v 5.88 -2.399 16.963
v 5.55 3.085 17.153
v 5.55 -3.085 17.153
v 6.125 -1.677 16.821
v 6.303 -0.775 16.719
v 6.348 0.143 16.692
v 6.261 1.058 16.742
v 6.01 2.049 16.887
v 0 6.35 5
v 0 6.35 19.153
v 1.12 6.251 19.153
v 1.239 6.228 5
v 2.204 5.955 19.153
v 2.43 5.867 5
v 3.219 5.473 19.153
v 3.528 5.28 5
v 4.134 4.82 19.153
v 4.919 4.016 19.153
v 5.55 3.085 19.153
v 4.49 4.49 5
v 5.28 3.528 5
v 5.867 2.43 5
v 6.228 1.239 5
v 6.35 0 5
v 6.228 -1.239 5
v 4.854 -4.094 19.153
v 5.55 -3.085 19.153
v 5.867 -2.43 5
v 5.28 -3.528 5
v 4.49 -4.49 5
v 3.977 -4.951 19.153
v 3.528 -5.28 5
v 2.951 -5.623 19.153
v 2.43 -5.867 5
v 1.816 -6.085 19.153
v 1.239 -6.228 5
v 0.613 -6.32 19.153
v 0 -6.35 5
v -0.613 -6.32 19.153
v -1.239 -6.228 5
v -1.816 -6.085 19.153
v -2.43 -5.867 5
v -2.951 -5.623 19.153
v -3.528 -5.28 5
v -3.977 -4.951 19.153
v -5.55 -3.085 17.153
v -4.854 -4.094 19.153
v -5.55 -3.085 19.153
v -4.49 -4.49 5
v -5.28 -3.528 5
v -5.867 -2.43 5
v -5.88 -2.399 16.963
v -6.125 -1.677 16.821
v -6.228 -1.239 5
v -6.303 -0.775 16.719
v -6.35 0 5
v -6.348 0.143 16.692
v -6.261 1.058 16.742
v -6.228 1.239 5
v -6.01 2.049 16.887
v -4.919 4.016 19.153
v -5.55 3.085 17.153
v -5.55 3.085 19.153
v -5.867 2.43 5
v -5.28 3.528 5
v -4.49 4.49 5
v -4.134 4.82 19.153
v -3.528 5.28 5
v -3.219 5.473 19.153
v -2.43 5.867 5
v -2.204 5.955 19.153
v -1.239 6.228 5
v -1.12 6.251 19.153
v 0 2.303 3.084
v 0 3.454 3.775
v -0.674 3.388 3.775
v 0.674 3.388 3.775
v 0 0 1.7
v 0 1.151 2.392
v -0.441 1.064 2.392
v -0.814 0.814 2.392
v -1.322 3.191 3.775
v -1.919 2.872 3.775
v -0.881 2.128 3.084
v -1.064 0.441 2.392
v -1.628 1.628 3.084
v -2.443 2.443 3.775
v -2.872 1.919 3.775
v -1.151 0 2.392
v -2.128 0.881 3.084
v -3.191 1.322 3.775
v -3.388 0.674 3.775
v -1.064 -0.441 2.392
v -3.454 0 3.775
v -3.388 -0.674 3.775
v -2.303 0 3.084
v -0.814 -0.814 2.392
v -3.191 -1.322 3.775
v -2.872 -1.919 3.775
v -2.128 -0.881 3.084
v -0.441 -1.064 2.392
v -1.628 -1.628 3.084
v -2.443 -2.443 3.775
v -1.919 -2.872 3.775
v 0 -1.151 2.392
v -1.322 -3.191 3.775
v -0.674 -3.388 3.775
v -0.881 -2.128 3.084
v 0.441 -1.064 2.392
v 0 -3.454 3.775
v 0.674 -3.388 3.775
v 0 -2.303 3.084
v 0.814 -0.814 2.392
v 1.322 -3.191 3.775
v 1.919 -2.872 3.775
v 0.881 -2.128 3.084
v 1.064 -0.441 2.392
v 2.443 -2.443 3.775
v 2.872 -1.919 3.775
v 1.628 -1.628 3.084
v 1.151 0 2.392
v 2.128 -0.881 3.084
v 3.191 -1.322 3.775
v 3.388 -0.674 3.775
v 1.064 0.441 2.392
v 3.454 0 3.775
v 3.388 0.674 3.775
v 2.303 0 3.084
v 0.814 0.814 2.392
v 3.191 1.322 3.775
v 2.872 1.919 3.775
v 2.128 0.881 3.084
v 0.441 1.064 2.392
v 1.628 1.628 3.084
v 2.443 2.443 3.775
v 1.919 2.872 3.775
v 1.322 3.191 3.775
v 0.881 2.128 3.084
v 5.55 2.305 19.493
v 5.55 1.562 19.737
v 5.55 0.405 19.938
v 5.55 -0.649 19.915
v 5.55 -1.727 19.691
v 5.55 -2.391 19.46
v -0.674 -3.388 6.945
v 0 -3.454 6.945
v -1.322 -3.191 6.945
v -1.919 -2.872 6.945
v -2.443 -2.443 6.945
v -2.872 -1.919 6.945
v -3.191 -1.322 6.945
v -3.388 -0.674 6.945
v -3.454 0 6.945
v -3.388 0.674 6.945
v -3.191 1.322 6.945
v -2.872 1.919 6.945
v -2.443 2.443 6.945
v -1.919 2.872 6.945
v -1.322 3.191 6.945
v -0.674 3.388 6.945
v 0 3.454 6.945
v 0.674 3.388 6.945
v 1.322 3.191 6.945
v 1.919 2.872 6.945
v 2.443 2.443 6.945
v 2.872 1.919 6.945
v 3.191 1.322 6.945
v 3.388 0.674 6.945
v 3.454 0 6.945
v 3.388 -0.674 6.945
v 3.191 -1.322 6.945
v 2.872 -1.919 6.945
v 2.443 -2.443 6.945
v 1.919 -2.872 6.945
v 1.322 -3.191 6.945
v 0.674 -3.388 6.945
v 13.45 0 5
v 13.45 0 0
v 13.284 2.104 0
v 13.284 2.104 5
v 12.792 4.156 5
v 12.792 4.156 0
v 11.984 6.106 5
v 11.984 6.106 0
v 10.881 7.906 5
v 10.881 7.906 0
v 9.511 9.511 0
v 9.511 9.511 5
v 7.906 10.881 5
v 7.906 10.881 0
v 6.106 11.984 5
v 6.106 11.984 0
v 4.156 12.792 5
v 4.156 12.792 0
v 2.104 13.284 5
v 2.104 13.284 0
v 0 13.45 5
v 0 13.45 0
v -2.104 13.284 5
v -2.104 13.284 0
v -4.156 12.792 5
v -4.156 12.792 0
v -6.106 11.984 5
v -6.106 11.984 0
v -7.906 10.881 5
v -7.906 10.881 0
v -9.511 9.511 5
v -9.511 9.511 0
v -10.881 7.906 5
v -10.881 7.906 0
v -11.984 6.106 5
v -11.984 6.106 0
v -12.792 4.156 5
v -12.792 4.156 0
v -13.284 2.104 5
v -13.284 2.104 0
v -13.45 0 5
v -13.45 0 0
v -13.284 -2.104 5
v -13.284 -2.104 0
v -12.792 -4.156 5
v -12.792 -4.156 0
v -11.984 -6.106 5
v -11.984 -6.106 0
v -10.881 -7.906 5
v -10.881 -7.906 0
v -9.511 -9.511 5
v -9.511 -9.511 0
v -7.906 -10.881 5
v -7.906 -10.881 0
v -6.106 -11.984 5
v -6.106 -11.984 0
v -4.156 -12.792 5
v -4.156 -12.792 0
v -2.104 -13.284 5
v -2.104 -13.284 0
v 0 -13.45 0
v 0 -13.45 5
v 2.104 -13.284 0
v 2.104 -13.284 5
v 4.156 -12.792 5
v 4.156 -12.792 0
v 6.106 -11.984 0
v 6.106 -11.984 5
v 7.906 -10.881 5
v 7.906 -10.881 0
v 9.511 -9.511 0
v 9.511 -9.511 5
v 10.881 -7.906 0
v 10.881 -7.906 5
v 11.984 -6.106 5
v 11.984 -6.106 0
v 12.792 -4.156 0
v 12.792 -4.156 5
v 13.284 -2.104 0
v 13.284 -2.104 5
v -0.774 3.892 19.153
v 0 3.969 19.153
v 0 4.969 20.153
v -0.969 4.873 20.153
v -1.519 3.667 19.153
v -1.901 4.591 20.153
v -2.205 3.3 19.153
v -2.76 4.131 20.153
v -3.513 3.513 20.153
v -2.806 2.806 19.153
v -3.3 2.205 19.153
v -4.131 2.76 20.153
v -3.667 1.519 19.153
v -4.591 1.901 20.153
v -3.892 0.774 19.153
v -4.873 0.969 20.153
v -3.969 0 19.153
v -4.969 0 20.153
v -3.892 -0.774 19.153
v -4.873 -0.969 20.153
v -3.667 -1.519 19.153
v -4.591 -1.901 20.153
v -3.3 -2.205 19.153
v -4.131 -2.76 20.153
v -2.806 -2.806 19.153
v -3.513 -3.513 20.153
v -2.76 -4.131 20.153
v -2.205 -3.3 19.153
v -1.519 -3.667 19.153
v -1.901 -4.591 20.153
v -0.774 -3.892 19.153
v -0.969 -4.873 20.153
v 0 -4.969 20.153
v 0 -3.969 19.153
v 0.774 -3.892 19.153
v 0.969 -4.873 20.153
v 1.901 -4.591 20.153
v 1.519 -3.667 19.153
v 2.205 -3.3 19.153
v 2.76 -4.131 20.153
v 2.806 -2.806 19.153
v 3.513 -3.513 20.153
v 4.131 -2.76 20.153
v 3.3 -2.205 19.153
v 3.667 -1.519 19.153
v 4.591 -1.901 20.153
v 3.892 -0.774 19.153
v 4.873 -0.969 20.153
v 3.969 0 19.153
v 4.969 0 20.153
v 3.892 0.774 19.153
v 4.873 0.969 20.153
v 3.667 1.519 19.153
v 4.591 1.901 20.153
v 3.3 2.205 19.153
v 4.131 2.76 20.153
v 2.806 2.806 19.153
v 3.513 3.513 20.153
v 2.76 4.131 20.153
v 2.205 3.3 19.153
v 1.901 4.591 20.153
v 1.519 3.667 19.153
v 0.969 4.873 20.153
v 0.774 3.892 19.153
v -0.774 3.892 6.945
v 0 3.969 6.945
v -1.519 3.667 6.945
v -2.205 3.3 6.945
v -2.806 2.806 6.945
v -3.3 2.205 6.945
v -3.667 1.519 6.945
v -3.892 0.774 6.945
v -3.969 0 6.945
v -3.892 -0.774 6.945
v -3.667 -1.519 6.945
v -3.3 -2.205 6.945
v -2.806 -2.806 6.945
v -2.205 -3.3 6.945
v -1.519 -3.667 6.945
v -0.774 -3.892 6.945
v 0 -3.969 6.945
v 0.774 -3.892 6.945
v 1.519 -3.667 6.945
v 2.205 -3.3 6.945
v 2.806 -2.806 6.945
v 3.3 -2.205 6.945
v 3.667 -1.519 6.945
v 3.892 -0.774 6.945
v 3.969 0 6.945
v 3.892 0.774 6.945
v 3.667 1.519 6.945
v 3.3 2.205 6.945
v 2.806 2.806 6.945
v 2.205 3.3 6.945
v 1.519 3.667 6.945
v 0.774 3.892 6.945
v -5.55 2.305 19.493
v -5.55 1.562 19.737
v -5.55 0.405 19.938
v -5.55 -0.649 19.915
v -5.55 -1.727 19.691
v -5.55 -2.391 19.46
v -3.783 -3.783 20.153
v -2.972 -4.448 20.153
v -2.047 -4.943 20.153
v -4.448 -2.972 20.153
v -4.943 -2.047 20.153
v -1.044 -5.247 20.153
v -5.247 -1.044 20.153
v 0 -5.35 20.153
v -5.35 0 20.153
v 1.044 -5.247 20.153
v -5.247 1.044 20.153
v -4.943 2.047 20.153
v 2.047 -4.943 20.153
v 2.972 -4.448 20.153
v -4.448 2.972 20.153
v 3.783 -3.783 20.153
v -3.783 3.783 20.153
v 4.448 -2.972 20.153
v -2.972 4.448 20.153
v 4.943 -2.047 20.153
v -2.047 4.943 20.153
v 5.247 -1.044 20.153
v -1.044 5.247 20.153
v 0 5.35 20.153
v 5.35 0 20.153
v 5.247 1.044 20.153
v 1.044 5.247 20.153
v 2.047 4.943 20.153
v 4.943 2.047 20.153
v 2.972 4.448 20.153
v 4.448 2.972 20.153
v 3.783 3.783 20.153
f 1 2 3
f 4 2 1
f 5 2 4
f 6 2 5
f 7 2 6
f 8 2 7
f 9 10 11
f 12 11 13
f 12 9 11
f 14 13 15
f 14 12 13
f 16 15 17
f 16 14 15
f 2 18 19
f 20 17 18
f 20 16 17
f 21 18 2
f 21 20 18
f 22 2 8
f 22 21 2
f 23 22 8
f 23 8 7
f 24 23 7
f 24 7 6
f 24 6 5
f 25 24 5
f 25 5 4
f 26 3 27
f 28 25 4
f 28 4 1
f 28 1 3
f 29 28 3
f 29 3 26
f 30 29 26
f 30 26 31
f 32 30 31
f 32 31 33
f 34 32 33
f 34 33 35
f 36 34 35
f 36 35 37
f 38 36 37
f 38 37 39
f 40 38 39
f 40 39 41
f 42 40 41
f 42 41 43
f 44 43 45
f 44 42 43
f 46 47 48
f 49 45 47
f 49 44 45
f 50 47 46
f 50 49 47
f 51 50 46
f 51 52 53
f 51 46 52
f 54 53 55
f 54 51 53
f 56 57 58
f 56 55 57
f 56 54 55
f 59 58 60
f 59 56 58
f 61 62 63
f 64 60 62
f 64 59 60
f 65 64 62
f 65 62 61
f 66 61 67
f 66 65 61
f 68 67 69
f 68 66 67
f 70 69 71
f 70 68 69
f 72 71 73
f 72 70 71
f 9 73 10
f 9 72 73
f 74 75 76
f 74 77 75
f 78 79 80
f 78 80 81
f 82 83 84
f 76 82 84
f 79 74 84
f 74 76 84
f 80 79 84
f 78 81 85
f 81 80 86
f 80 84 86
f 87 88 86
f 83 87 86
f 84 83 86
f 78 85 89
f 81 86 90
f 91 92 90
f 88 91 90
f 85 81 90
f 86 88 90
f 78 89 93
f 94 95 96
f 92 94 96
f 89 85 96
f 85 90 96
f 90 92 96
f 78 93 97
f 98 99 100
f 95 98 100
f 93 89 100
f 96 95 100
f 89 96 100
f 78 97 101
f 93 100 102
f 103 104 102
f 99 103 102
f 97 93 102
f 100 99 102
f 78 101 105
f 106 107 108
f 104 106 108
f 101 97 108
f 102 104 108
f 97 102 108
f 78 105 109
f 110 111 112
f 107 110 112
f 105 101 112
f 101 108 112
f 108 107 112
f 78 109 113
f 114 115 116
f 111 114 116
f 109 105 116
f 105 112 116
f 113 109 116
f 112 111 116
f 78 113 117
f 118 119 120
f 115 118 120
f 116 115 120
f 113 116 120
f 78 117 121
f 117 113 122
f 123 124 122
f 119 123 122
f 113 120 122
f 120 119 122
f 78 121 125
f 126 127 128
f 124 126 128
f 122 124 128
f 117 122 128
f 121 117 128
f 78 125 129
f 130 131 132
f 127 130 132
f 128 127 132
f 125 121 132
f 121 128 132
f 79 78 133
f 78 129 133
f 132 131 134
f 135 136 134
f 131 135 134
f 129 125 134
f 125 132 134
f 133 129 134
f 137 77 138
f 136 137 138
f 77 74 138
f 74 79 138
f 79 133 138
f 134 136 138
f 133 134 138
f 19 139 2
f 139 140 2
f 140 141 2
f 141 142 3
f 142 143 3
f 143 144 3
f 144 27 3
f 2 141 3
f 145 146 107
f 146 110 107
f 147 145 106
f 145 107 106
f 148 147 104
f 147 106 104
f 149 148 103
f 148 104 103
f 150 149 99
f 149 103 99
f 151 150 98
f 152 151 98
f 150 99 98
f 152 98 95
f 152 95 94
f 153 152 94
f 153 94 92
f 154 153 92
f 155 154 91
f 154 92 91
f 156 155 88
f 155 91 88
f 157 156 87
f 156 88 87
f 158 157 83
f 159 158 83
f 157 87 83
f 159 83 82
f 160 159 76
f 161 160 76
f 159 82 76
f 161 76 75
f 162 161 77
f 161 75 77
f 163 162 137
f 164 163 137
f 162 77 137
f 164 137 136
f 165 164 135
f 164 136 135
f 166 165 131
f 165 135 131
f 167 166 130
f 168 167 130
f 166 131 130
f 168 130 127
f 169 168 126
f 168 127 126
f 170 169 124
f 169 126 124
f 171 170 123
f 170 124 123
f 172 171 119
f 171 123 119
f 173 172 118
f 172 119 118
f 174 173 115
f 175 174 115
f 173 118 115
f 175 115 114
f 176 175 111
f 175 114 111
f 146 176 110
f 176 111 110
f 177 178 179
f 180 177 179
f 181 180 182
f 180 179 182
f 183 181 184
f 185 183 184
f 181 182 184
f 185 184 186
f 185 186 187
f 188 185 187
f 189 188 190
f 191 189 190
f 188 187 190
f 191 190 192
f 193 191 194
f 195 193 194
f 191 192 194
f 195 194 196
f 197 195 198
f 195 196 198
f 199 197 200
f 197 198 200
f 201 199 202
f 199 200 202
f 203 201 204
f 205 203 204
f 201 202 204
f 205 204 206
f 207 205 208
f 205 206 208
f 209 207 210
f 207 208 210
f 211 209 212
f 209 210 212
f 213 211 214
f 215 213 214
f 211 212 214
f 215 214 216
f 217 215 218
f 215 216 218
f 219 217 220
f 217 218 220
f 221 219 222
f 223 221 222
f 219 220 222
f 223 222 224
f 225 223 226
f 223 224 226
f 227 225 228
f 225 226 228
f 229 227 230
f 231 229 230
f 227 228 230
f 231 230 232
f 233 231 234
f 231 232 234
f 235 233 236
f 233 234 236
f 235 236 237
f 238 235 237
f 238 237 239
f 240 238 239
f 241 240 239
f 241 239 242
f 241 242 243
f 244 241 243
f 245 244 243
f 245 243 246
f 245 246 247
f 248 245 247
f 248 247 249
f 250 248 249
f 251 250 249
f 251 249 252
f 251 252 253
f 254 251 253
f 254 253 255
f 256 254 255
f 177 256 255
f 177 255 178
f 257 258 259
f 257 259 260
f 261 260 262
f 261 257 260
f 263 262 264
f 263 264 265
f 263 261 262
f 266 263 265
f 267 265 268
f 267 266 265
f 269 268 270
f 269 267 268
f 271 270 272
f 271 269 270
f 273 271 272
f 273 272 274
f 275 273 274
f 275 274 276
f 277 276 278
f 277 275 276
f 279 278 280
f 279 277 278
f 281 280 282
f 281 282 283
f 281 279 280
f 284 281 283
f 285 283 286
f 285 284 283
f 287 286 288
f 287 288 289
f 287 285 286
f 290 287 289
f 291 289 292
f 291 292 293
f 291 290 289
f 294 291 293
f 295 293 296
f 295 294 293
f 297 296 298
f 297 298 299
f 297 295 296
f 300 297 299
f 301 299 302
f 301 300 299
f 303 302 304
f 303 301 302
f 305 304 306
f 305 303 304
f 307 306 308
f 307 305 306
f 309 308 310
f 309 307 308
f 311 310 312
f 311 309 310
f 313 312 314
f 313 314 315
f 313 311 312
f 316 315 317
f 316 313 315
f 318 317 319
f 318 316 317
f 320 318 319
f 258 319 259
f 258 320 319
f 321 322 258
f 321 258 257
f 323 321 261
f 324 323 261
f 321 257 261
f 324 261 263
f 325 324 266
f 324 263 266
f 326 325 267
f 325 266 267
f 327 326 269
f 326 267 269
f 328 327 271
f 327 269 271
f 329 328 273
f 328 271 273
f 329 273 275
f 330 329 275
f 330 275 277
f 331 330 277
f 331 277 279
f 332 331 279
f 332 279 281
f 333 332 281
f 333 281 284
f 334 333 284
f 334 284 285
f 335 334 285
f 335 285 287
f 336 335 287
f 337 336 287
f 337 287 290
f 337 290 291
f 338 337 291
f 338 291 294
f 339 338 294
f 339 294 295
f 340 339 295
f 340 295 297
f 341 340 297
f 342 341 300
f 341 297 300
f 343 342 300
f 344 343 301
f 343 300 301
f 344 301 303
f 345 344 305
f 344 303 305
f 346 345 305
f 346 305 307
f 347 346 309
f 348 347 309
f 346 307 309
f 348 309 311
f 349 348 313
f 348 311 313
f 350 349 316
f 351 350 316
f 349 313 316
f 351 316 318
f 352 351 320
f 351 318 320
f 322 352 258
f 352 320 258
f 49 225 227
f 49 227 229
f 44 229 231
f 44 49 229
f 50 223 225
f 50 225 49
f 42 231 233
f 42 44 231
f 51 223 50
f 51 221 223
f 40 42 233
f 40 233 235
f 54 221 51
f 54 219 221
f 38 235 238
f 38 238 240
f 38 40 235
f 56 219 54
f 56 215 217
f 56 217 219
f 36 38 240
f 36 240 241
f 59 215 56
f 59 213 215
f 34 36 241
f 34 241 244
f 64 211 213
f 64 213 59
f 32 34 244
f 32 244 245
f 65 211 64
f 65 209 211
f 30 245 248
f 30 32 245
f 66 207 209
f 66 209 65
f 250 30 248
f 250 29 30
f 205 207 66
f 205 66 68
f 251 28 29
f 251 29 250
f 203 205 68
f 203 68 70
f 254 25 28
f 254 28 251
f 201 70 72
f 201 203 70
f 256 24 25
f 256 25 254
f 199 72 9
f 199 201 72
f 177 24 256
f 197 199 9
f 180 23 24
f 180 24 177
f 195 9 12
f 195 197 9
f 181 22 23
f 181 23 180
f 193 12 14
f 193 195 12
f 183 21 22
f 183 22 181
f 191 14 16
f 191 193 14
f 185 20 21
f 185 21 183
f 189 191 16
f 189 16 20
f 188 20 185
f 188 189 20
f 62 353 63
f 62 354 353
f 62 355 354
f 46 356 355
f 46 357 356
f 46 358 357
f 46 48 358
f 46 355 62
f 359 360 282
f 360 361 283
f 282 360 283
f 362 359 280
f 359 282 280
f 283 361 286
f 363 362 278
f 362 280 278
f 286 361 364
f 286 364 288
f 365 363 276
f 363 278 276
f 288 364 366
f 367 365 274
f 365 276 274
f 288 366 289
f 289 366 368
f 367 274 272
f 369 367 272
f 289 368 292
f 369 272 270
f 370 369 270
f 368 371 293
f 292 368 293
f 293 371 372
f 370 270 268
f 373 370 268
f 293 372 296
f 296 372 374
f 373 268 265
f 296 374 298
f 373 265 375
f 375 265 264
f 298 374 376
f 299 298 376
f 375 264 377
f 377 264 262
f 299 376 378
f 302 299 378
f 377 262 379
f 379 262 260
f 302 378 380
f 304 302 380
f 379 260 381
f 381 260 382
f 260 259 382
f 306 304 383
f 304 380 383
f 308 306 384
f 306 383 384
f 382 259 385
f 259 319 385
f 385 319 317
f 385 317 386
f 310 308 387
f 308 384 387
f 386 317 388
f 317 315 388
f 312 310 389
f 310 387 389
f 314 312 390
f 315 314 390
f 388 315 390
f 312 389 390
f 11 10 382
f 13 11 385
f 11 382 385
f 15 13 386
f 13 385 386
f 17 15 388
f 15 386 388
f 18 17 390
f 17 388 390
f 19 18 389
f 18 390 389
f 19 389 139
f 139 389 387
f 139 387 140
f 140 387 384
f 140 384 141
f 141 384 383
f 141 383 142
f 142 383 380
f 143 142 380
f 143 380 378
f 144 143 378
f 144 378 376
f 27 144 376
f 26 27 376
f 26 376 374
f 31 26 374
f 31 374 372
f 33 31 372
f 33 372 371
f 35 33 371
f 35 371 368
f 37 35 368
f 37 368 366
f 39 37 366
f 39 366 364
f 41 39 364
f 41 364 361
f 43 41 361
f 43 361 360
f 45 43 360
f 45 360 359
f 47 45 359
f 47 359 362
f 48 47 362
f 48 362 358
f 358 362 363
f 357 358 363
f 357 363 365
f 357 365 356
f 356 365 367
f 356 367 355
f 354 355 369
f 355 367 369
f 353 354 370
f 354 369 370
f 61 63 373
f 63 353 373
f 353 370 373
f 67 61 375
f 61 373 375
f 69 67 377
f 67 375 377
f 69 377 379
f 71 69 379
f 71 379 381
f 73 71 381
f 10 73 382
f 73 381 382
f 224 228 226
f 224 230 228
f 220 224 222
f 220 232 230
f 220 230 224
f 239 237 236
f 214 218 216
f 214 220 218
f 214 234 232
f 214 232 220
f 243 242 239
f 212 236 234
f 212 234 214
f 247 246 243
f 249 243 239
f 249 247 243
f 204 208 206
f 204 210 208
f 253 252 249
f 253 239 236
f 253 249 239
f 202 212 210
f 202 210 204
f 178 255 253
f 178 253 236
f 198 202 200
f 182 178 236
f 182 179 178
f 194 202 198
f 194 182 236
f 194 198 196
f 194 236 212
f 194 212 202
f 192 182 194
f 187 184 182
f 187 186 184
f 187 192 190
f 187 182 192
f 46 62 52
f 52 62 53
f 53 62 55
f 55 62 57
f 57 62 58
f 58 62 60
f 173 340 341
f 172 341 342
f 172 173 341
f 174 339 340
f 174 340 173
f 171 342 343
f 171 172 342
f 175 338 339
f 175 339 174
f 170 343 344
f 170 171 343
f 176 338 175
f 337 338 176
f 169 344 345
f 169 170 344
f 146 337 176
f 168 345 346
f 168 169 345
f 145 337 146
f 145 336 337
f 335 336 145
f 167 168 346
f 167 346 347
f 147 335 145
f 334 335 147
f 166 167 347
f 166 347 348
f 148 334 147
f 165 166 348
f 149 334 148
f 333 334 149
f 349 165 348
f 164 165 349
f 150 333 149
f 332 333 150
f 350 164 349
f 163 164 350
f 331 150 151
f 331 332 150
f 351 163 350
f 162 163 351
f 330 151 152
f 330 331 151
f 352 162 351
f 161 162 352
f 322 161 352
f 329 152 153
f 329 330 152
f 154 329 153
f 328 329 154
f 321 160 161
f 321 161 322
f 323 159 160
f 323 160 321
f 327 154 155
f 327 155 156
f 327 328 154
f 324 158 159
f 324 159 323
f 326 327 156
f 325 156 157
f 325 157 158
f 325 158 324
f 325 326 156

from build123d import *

# Parameters (mm, degrees)
SKETCH1_R                                 = 13.45
PISTON_DEPTH                              = 5
SKETCH2_R                                 = 6.35
ROD_DEPTH                                 = 20.153
F_106_5_16_24_INTERNAL_THREAD_D           = 6.9088
F_106_5_16_24_INTERNAL_THREAD_DEPTH       = 16.37754
F_106_5_16_24_INTERNAL_THREAD_CBORE_D     = 7.9375
F_106_5_16_24_INTERNAL_THREAD_CBORE_DEPTH = 13.208
F_106_5_16_24_INTERNAL_THREAD_TIP         = 2.075612922
ROD_END_CHAMFER_SIZE                      = 1
WRENCH_FLATS_DEPTH                        = 28.711882091
WRENCH_FLATS_DEPTH_BACK                   = 28.711882091


with BuildPart() as part:
    # Sketch1 → Piston (new body)
    with BuildSketch(Plane.XY):
        Circle(SKETCH1_R)
    extrude(amount=PISTON_DEPTH)

    # Sketch2 → Rod (add)
    with BuildSketch(Plane(origin=(0, 0, 0), x_dir=(-1, 0, 0), z_dir=(0, 0, -1))):
        with Locations(Location((0, 0, 0), (0, 0, 90))):
            Circle(SKETCH2_R)
    extrude(amount=-ROD_DEPTH)

    # 106 5/16-24 Internal Thread
    with Locations(Plane(origin=(0, 0, 20.153), x_dir=(0, 1, 0), z_dir=(0, 0, 1))):
        with Locations((0, 0)):
            CounterBoreHole(F_106_5_16_24_INTERNAL_THREAD_D / 2, F_106_5_16_24_INTERNAL_THREAD_CBORE_D / 2, F_106_5_16_24_INTERNAL_THREAD_CBORE_DEPTH, depth=F_106_5_16_24_INTERNAL_THREAD_DEPTH)
            with Locations((0, 0, -(F_106_5_16_24_INTERNAL_THREAD_DEPTH + F_106_5_16_24_INTERNAL_THREAD_TIP / 2))):  # 118° drill point
                Cone(0, F_106_5_16_24_INTERNAL_THREAD_D / 2, F_106_5_16_24_INTERNAL_THREAD_TIP, mode=Mode.SUBTRACT)

    # Rod End Chamfer
    rod_end_chamfer_edges = [part.edges().sort_by_distance(p)[0] for p in [
        (0, -3.96875, 20.153),
        (0, -6.35, 20.153),
    ]]
    chamfer(rod_end_chamfer_edges, length=ROD_END_CHAMFER_SIZE)

    # Sketch11 → Wrench Flats (cut, two sides: drawn at the far end of the back side and taken through both)
    with BuildSketch(Plane(origin=(0, 0, 0), x_dir=(1, 0, 0), z_dir=(0, 1, 0)).offset(-WRENCH_FLATS_DEPTH_BACK)):
        Polygon((-5.55, -20.153), (-5.55, -17.153), (-10.55, -14.266248654), (-10.55, -20.153), align=None)
        Polygon((5.55, -20.153), (5.55, -17.153), (10.55, -14.266248654), (10.55, -20.153), align=None)
    extrude(amount=WRENCH_FLATS_DEPTH + WRENCH_FLATS_DEPTH_BACK, mode=Mode.SUBTRACT)


solid = part.part
